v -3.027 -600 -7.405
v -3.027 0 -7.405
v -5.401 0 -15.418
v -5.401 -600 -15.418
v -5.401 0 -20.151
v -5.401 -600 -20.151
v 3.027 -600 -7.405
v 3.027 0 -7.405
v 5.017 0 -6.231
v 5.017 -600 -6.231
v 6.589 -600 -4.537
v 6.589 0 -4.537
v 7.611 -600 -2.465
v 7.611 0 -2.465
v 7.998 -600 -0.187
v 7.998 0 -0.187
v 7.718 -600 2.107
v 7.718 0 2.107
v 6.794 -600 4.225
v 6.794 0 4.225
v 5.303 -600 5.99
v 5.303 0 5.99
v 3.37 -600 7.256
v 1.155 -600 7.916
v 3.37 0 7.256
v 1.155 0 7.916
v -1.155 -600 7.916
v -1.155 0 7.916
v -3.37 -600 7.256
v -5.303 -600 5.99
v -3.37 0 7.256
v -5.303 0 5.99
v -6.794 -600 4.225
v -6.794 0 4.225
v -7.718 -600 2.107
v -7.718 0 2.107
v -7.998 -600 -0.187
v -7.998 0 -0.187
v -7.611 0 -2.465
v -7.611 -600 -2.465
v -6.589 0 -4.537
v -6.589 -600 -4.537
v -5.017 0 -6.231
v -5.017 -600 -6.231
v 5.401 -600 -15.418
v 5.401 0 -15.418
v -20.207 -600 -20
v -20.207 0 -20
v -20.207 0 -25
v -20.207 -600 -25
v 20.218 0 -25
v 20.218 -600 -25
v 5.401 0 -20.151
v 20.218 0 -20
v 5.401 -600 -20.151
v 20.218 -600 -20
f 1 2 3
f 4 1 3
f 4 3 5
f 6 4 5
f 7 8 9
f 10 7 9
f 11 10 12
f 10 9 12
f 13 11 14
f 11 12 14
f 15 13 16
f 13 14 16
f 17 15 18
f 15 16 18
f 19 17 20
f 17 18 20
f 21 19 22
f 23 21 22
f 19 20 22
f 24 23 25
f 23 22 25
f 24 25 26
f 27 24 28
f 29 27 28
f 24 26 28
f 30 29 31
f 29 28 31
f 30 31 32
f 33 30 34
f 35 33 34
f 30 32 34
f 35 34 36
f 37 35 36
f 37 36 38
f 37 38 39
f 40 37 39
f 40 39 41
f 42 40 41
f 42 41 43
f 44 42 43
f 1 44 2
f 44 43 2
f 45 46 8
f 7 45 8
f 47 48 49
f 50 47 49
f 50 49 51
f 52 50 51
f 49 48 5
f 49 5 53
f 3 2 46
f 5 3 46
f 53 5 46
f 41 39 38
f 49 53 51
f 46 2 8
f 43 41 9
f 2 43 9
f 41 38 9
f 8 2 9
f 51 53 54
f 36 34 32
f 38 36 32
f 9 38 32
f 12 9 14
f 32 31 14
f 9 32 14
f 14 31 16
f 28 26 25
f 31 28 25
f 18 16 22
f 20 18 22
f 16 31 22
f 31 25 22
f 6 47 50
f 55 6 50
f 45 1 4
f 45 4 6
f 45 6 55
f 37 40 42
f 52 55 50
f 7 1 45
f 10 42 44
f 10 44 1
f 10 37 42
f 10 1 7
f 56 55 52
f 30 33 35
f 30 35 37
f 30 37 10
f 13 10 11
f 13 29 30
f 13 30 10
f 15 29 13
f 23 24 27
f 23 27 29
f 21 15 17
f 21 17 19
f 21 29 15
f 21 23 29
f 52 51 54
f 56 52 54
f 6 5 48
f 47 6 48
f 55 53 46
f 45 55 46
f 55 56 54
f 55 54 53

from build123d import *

# Parameters (mm, degrees)
F1_DEPTH = 600


with BuildPart() as f1:
    # F0 (on Front) → F1 (new body)
    with BuildSketch(Plane.XZ):
        with BuildLine():
            Line((5.400592, -15.418472), (3.027247, -7.405118))
            ThreePointArc((3.027247, -7.405118), (0, 8), (-3.027247, -7.405118))
            Line((-3.027247, -7.405118), (-5.400592, -15.418472))
            Line((-5.400592, -15.418472), (-5.400592, -20.151161))
            Line((-5.400592, -20.151161), (-20.206842, -20))
            Line((-20.206842, -20), (-20.206842, -25))
            Line((-20.206842, -25), (0, -25))
            Line((0, -25), (20.2184, -25))
            Line((20.2184, -25), (20.2184, -19.999882))
            Line((20.2184, -19.999882), (5.400592, -20.151161))
            Line((5.400592, -20.151161), (5.400592, -15.418472))
        make_face()
    extrude(amount=F1_DEPTH)


solid = f1.part
